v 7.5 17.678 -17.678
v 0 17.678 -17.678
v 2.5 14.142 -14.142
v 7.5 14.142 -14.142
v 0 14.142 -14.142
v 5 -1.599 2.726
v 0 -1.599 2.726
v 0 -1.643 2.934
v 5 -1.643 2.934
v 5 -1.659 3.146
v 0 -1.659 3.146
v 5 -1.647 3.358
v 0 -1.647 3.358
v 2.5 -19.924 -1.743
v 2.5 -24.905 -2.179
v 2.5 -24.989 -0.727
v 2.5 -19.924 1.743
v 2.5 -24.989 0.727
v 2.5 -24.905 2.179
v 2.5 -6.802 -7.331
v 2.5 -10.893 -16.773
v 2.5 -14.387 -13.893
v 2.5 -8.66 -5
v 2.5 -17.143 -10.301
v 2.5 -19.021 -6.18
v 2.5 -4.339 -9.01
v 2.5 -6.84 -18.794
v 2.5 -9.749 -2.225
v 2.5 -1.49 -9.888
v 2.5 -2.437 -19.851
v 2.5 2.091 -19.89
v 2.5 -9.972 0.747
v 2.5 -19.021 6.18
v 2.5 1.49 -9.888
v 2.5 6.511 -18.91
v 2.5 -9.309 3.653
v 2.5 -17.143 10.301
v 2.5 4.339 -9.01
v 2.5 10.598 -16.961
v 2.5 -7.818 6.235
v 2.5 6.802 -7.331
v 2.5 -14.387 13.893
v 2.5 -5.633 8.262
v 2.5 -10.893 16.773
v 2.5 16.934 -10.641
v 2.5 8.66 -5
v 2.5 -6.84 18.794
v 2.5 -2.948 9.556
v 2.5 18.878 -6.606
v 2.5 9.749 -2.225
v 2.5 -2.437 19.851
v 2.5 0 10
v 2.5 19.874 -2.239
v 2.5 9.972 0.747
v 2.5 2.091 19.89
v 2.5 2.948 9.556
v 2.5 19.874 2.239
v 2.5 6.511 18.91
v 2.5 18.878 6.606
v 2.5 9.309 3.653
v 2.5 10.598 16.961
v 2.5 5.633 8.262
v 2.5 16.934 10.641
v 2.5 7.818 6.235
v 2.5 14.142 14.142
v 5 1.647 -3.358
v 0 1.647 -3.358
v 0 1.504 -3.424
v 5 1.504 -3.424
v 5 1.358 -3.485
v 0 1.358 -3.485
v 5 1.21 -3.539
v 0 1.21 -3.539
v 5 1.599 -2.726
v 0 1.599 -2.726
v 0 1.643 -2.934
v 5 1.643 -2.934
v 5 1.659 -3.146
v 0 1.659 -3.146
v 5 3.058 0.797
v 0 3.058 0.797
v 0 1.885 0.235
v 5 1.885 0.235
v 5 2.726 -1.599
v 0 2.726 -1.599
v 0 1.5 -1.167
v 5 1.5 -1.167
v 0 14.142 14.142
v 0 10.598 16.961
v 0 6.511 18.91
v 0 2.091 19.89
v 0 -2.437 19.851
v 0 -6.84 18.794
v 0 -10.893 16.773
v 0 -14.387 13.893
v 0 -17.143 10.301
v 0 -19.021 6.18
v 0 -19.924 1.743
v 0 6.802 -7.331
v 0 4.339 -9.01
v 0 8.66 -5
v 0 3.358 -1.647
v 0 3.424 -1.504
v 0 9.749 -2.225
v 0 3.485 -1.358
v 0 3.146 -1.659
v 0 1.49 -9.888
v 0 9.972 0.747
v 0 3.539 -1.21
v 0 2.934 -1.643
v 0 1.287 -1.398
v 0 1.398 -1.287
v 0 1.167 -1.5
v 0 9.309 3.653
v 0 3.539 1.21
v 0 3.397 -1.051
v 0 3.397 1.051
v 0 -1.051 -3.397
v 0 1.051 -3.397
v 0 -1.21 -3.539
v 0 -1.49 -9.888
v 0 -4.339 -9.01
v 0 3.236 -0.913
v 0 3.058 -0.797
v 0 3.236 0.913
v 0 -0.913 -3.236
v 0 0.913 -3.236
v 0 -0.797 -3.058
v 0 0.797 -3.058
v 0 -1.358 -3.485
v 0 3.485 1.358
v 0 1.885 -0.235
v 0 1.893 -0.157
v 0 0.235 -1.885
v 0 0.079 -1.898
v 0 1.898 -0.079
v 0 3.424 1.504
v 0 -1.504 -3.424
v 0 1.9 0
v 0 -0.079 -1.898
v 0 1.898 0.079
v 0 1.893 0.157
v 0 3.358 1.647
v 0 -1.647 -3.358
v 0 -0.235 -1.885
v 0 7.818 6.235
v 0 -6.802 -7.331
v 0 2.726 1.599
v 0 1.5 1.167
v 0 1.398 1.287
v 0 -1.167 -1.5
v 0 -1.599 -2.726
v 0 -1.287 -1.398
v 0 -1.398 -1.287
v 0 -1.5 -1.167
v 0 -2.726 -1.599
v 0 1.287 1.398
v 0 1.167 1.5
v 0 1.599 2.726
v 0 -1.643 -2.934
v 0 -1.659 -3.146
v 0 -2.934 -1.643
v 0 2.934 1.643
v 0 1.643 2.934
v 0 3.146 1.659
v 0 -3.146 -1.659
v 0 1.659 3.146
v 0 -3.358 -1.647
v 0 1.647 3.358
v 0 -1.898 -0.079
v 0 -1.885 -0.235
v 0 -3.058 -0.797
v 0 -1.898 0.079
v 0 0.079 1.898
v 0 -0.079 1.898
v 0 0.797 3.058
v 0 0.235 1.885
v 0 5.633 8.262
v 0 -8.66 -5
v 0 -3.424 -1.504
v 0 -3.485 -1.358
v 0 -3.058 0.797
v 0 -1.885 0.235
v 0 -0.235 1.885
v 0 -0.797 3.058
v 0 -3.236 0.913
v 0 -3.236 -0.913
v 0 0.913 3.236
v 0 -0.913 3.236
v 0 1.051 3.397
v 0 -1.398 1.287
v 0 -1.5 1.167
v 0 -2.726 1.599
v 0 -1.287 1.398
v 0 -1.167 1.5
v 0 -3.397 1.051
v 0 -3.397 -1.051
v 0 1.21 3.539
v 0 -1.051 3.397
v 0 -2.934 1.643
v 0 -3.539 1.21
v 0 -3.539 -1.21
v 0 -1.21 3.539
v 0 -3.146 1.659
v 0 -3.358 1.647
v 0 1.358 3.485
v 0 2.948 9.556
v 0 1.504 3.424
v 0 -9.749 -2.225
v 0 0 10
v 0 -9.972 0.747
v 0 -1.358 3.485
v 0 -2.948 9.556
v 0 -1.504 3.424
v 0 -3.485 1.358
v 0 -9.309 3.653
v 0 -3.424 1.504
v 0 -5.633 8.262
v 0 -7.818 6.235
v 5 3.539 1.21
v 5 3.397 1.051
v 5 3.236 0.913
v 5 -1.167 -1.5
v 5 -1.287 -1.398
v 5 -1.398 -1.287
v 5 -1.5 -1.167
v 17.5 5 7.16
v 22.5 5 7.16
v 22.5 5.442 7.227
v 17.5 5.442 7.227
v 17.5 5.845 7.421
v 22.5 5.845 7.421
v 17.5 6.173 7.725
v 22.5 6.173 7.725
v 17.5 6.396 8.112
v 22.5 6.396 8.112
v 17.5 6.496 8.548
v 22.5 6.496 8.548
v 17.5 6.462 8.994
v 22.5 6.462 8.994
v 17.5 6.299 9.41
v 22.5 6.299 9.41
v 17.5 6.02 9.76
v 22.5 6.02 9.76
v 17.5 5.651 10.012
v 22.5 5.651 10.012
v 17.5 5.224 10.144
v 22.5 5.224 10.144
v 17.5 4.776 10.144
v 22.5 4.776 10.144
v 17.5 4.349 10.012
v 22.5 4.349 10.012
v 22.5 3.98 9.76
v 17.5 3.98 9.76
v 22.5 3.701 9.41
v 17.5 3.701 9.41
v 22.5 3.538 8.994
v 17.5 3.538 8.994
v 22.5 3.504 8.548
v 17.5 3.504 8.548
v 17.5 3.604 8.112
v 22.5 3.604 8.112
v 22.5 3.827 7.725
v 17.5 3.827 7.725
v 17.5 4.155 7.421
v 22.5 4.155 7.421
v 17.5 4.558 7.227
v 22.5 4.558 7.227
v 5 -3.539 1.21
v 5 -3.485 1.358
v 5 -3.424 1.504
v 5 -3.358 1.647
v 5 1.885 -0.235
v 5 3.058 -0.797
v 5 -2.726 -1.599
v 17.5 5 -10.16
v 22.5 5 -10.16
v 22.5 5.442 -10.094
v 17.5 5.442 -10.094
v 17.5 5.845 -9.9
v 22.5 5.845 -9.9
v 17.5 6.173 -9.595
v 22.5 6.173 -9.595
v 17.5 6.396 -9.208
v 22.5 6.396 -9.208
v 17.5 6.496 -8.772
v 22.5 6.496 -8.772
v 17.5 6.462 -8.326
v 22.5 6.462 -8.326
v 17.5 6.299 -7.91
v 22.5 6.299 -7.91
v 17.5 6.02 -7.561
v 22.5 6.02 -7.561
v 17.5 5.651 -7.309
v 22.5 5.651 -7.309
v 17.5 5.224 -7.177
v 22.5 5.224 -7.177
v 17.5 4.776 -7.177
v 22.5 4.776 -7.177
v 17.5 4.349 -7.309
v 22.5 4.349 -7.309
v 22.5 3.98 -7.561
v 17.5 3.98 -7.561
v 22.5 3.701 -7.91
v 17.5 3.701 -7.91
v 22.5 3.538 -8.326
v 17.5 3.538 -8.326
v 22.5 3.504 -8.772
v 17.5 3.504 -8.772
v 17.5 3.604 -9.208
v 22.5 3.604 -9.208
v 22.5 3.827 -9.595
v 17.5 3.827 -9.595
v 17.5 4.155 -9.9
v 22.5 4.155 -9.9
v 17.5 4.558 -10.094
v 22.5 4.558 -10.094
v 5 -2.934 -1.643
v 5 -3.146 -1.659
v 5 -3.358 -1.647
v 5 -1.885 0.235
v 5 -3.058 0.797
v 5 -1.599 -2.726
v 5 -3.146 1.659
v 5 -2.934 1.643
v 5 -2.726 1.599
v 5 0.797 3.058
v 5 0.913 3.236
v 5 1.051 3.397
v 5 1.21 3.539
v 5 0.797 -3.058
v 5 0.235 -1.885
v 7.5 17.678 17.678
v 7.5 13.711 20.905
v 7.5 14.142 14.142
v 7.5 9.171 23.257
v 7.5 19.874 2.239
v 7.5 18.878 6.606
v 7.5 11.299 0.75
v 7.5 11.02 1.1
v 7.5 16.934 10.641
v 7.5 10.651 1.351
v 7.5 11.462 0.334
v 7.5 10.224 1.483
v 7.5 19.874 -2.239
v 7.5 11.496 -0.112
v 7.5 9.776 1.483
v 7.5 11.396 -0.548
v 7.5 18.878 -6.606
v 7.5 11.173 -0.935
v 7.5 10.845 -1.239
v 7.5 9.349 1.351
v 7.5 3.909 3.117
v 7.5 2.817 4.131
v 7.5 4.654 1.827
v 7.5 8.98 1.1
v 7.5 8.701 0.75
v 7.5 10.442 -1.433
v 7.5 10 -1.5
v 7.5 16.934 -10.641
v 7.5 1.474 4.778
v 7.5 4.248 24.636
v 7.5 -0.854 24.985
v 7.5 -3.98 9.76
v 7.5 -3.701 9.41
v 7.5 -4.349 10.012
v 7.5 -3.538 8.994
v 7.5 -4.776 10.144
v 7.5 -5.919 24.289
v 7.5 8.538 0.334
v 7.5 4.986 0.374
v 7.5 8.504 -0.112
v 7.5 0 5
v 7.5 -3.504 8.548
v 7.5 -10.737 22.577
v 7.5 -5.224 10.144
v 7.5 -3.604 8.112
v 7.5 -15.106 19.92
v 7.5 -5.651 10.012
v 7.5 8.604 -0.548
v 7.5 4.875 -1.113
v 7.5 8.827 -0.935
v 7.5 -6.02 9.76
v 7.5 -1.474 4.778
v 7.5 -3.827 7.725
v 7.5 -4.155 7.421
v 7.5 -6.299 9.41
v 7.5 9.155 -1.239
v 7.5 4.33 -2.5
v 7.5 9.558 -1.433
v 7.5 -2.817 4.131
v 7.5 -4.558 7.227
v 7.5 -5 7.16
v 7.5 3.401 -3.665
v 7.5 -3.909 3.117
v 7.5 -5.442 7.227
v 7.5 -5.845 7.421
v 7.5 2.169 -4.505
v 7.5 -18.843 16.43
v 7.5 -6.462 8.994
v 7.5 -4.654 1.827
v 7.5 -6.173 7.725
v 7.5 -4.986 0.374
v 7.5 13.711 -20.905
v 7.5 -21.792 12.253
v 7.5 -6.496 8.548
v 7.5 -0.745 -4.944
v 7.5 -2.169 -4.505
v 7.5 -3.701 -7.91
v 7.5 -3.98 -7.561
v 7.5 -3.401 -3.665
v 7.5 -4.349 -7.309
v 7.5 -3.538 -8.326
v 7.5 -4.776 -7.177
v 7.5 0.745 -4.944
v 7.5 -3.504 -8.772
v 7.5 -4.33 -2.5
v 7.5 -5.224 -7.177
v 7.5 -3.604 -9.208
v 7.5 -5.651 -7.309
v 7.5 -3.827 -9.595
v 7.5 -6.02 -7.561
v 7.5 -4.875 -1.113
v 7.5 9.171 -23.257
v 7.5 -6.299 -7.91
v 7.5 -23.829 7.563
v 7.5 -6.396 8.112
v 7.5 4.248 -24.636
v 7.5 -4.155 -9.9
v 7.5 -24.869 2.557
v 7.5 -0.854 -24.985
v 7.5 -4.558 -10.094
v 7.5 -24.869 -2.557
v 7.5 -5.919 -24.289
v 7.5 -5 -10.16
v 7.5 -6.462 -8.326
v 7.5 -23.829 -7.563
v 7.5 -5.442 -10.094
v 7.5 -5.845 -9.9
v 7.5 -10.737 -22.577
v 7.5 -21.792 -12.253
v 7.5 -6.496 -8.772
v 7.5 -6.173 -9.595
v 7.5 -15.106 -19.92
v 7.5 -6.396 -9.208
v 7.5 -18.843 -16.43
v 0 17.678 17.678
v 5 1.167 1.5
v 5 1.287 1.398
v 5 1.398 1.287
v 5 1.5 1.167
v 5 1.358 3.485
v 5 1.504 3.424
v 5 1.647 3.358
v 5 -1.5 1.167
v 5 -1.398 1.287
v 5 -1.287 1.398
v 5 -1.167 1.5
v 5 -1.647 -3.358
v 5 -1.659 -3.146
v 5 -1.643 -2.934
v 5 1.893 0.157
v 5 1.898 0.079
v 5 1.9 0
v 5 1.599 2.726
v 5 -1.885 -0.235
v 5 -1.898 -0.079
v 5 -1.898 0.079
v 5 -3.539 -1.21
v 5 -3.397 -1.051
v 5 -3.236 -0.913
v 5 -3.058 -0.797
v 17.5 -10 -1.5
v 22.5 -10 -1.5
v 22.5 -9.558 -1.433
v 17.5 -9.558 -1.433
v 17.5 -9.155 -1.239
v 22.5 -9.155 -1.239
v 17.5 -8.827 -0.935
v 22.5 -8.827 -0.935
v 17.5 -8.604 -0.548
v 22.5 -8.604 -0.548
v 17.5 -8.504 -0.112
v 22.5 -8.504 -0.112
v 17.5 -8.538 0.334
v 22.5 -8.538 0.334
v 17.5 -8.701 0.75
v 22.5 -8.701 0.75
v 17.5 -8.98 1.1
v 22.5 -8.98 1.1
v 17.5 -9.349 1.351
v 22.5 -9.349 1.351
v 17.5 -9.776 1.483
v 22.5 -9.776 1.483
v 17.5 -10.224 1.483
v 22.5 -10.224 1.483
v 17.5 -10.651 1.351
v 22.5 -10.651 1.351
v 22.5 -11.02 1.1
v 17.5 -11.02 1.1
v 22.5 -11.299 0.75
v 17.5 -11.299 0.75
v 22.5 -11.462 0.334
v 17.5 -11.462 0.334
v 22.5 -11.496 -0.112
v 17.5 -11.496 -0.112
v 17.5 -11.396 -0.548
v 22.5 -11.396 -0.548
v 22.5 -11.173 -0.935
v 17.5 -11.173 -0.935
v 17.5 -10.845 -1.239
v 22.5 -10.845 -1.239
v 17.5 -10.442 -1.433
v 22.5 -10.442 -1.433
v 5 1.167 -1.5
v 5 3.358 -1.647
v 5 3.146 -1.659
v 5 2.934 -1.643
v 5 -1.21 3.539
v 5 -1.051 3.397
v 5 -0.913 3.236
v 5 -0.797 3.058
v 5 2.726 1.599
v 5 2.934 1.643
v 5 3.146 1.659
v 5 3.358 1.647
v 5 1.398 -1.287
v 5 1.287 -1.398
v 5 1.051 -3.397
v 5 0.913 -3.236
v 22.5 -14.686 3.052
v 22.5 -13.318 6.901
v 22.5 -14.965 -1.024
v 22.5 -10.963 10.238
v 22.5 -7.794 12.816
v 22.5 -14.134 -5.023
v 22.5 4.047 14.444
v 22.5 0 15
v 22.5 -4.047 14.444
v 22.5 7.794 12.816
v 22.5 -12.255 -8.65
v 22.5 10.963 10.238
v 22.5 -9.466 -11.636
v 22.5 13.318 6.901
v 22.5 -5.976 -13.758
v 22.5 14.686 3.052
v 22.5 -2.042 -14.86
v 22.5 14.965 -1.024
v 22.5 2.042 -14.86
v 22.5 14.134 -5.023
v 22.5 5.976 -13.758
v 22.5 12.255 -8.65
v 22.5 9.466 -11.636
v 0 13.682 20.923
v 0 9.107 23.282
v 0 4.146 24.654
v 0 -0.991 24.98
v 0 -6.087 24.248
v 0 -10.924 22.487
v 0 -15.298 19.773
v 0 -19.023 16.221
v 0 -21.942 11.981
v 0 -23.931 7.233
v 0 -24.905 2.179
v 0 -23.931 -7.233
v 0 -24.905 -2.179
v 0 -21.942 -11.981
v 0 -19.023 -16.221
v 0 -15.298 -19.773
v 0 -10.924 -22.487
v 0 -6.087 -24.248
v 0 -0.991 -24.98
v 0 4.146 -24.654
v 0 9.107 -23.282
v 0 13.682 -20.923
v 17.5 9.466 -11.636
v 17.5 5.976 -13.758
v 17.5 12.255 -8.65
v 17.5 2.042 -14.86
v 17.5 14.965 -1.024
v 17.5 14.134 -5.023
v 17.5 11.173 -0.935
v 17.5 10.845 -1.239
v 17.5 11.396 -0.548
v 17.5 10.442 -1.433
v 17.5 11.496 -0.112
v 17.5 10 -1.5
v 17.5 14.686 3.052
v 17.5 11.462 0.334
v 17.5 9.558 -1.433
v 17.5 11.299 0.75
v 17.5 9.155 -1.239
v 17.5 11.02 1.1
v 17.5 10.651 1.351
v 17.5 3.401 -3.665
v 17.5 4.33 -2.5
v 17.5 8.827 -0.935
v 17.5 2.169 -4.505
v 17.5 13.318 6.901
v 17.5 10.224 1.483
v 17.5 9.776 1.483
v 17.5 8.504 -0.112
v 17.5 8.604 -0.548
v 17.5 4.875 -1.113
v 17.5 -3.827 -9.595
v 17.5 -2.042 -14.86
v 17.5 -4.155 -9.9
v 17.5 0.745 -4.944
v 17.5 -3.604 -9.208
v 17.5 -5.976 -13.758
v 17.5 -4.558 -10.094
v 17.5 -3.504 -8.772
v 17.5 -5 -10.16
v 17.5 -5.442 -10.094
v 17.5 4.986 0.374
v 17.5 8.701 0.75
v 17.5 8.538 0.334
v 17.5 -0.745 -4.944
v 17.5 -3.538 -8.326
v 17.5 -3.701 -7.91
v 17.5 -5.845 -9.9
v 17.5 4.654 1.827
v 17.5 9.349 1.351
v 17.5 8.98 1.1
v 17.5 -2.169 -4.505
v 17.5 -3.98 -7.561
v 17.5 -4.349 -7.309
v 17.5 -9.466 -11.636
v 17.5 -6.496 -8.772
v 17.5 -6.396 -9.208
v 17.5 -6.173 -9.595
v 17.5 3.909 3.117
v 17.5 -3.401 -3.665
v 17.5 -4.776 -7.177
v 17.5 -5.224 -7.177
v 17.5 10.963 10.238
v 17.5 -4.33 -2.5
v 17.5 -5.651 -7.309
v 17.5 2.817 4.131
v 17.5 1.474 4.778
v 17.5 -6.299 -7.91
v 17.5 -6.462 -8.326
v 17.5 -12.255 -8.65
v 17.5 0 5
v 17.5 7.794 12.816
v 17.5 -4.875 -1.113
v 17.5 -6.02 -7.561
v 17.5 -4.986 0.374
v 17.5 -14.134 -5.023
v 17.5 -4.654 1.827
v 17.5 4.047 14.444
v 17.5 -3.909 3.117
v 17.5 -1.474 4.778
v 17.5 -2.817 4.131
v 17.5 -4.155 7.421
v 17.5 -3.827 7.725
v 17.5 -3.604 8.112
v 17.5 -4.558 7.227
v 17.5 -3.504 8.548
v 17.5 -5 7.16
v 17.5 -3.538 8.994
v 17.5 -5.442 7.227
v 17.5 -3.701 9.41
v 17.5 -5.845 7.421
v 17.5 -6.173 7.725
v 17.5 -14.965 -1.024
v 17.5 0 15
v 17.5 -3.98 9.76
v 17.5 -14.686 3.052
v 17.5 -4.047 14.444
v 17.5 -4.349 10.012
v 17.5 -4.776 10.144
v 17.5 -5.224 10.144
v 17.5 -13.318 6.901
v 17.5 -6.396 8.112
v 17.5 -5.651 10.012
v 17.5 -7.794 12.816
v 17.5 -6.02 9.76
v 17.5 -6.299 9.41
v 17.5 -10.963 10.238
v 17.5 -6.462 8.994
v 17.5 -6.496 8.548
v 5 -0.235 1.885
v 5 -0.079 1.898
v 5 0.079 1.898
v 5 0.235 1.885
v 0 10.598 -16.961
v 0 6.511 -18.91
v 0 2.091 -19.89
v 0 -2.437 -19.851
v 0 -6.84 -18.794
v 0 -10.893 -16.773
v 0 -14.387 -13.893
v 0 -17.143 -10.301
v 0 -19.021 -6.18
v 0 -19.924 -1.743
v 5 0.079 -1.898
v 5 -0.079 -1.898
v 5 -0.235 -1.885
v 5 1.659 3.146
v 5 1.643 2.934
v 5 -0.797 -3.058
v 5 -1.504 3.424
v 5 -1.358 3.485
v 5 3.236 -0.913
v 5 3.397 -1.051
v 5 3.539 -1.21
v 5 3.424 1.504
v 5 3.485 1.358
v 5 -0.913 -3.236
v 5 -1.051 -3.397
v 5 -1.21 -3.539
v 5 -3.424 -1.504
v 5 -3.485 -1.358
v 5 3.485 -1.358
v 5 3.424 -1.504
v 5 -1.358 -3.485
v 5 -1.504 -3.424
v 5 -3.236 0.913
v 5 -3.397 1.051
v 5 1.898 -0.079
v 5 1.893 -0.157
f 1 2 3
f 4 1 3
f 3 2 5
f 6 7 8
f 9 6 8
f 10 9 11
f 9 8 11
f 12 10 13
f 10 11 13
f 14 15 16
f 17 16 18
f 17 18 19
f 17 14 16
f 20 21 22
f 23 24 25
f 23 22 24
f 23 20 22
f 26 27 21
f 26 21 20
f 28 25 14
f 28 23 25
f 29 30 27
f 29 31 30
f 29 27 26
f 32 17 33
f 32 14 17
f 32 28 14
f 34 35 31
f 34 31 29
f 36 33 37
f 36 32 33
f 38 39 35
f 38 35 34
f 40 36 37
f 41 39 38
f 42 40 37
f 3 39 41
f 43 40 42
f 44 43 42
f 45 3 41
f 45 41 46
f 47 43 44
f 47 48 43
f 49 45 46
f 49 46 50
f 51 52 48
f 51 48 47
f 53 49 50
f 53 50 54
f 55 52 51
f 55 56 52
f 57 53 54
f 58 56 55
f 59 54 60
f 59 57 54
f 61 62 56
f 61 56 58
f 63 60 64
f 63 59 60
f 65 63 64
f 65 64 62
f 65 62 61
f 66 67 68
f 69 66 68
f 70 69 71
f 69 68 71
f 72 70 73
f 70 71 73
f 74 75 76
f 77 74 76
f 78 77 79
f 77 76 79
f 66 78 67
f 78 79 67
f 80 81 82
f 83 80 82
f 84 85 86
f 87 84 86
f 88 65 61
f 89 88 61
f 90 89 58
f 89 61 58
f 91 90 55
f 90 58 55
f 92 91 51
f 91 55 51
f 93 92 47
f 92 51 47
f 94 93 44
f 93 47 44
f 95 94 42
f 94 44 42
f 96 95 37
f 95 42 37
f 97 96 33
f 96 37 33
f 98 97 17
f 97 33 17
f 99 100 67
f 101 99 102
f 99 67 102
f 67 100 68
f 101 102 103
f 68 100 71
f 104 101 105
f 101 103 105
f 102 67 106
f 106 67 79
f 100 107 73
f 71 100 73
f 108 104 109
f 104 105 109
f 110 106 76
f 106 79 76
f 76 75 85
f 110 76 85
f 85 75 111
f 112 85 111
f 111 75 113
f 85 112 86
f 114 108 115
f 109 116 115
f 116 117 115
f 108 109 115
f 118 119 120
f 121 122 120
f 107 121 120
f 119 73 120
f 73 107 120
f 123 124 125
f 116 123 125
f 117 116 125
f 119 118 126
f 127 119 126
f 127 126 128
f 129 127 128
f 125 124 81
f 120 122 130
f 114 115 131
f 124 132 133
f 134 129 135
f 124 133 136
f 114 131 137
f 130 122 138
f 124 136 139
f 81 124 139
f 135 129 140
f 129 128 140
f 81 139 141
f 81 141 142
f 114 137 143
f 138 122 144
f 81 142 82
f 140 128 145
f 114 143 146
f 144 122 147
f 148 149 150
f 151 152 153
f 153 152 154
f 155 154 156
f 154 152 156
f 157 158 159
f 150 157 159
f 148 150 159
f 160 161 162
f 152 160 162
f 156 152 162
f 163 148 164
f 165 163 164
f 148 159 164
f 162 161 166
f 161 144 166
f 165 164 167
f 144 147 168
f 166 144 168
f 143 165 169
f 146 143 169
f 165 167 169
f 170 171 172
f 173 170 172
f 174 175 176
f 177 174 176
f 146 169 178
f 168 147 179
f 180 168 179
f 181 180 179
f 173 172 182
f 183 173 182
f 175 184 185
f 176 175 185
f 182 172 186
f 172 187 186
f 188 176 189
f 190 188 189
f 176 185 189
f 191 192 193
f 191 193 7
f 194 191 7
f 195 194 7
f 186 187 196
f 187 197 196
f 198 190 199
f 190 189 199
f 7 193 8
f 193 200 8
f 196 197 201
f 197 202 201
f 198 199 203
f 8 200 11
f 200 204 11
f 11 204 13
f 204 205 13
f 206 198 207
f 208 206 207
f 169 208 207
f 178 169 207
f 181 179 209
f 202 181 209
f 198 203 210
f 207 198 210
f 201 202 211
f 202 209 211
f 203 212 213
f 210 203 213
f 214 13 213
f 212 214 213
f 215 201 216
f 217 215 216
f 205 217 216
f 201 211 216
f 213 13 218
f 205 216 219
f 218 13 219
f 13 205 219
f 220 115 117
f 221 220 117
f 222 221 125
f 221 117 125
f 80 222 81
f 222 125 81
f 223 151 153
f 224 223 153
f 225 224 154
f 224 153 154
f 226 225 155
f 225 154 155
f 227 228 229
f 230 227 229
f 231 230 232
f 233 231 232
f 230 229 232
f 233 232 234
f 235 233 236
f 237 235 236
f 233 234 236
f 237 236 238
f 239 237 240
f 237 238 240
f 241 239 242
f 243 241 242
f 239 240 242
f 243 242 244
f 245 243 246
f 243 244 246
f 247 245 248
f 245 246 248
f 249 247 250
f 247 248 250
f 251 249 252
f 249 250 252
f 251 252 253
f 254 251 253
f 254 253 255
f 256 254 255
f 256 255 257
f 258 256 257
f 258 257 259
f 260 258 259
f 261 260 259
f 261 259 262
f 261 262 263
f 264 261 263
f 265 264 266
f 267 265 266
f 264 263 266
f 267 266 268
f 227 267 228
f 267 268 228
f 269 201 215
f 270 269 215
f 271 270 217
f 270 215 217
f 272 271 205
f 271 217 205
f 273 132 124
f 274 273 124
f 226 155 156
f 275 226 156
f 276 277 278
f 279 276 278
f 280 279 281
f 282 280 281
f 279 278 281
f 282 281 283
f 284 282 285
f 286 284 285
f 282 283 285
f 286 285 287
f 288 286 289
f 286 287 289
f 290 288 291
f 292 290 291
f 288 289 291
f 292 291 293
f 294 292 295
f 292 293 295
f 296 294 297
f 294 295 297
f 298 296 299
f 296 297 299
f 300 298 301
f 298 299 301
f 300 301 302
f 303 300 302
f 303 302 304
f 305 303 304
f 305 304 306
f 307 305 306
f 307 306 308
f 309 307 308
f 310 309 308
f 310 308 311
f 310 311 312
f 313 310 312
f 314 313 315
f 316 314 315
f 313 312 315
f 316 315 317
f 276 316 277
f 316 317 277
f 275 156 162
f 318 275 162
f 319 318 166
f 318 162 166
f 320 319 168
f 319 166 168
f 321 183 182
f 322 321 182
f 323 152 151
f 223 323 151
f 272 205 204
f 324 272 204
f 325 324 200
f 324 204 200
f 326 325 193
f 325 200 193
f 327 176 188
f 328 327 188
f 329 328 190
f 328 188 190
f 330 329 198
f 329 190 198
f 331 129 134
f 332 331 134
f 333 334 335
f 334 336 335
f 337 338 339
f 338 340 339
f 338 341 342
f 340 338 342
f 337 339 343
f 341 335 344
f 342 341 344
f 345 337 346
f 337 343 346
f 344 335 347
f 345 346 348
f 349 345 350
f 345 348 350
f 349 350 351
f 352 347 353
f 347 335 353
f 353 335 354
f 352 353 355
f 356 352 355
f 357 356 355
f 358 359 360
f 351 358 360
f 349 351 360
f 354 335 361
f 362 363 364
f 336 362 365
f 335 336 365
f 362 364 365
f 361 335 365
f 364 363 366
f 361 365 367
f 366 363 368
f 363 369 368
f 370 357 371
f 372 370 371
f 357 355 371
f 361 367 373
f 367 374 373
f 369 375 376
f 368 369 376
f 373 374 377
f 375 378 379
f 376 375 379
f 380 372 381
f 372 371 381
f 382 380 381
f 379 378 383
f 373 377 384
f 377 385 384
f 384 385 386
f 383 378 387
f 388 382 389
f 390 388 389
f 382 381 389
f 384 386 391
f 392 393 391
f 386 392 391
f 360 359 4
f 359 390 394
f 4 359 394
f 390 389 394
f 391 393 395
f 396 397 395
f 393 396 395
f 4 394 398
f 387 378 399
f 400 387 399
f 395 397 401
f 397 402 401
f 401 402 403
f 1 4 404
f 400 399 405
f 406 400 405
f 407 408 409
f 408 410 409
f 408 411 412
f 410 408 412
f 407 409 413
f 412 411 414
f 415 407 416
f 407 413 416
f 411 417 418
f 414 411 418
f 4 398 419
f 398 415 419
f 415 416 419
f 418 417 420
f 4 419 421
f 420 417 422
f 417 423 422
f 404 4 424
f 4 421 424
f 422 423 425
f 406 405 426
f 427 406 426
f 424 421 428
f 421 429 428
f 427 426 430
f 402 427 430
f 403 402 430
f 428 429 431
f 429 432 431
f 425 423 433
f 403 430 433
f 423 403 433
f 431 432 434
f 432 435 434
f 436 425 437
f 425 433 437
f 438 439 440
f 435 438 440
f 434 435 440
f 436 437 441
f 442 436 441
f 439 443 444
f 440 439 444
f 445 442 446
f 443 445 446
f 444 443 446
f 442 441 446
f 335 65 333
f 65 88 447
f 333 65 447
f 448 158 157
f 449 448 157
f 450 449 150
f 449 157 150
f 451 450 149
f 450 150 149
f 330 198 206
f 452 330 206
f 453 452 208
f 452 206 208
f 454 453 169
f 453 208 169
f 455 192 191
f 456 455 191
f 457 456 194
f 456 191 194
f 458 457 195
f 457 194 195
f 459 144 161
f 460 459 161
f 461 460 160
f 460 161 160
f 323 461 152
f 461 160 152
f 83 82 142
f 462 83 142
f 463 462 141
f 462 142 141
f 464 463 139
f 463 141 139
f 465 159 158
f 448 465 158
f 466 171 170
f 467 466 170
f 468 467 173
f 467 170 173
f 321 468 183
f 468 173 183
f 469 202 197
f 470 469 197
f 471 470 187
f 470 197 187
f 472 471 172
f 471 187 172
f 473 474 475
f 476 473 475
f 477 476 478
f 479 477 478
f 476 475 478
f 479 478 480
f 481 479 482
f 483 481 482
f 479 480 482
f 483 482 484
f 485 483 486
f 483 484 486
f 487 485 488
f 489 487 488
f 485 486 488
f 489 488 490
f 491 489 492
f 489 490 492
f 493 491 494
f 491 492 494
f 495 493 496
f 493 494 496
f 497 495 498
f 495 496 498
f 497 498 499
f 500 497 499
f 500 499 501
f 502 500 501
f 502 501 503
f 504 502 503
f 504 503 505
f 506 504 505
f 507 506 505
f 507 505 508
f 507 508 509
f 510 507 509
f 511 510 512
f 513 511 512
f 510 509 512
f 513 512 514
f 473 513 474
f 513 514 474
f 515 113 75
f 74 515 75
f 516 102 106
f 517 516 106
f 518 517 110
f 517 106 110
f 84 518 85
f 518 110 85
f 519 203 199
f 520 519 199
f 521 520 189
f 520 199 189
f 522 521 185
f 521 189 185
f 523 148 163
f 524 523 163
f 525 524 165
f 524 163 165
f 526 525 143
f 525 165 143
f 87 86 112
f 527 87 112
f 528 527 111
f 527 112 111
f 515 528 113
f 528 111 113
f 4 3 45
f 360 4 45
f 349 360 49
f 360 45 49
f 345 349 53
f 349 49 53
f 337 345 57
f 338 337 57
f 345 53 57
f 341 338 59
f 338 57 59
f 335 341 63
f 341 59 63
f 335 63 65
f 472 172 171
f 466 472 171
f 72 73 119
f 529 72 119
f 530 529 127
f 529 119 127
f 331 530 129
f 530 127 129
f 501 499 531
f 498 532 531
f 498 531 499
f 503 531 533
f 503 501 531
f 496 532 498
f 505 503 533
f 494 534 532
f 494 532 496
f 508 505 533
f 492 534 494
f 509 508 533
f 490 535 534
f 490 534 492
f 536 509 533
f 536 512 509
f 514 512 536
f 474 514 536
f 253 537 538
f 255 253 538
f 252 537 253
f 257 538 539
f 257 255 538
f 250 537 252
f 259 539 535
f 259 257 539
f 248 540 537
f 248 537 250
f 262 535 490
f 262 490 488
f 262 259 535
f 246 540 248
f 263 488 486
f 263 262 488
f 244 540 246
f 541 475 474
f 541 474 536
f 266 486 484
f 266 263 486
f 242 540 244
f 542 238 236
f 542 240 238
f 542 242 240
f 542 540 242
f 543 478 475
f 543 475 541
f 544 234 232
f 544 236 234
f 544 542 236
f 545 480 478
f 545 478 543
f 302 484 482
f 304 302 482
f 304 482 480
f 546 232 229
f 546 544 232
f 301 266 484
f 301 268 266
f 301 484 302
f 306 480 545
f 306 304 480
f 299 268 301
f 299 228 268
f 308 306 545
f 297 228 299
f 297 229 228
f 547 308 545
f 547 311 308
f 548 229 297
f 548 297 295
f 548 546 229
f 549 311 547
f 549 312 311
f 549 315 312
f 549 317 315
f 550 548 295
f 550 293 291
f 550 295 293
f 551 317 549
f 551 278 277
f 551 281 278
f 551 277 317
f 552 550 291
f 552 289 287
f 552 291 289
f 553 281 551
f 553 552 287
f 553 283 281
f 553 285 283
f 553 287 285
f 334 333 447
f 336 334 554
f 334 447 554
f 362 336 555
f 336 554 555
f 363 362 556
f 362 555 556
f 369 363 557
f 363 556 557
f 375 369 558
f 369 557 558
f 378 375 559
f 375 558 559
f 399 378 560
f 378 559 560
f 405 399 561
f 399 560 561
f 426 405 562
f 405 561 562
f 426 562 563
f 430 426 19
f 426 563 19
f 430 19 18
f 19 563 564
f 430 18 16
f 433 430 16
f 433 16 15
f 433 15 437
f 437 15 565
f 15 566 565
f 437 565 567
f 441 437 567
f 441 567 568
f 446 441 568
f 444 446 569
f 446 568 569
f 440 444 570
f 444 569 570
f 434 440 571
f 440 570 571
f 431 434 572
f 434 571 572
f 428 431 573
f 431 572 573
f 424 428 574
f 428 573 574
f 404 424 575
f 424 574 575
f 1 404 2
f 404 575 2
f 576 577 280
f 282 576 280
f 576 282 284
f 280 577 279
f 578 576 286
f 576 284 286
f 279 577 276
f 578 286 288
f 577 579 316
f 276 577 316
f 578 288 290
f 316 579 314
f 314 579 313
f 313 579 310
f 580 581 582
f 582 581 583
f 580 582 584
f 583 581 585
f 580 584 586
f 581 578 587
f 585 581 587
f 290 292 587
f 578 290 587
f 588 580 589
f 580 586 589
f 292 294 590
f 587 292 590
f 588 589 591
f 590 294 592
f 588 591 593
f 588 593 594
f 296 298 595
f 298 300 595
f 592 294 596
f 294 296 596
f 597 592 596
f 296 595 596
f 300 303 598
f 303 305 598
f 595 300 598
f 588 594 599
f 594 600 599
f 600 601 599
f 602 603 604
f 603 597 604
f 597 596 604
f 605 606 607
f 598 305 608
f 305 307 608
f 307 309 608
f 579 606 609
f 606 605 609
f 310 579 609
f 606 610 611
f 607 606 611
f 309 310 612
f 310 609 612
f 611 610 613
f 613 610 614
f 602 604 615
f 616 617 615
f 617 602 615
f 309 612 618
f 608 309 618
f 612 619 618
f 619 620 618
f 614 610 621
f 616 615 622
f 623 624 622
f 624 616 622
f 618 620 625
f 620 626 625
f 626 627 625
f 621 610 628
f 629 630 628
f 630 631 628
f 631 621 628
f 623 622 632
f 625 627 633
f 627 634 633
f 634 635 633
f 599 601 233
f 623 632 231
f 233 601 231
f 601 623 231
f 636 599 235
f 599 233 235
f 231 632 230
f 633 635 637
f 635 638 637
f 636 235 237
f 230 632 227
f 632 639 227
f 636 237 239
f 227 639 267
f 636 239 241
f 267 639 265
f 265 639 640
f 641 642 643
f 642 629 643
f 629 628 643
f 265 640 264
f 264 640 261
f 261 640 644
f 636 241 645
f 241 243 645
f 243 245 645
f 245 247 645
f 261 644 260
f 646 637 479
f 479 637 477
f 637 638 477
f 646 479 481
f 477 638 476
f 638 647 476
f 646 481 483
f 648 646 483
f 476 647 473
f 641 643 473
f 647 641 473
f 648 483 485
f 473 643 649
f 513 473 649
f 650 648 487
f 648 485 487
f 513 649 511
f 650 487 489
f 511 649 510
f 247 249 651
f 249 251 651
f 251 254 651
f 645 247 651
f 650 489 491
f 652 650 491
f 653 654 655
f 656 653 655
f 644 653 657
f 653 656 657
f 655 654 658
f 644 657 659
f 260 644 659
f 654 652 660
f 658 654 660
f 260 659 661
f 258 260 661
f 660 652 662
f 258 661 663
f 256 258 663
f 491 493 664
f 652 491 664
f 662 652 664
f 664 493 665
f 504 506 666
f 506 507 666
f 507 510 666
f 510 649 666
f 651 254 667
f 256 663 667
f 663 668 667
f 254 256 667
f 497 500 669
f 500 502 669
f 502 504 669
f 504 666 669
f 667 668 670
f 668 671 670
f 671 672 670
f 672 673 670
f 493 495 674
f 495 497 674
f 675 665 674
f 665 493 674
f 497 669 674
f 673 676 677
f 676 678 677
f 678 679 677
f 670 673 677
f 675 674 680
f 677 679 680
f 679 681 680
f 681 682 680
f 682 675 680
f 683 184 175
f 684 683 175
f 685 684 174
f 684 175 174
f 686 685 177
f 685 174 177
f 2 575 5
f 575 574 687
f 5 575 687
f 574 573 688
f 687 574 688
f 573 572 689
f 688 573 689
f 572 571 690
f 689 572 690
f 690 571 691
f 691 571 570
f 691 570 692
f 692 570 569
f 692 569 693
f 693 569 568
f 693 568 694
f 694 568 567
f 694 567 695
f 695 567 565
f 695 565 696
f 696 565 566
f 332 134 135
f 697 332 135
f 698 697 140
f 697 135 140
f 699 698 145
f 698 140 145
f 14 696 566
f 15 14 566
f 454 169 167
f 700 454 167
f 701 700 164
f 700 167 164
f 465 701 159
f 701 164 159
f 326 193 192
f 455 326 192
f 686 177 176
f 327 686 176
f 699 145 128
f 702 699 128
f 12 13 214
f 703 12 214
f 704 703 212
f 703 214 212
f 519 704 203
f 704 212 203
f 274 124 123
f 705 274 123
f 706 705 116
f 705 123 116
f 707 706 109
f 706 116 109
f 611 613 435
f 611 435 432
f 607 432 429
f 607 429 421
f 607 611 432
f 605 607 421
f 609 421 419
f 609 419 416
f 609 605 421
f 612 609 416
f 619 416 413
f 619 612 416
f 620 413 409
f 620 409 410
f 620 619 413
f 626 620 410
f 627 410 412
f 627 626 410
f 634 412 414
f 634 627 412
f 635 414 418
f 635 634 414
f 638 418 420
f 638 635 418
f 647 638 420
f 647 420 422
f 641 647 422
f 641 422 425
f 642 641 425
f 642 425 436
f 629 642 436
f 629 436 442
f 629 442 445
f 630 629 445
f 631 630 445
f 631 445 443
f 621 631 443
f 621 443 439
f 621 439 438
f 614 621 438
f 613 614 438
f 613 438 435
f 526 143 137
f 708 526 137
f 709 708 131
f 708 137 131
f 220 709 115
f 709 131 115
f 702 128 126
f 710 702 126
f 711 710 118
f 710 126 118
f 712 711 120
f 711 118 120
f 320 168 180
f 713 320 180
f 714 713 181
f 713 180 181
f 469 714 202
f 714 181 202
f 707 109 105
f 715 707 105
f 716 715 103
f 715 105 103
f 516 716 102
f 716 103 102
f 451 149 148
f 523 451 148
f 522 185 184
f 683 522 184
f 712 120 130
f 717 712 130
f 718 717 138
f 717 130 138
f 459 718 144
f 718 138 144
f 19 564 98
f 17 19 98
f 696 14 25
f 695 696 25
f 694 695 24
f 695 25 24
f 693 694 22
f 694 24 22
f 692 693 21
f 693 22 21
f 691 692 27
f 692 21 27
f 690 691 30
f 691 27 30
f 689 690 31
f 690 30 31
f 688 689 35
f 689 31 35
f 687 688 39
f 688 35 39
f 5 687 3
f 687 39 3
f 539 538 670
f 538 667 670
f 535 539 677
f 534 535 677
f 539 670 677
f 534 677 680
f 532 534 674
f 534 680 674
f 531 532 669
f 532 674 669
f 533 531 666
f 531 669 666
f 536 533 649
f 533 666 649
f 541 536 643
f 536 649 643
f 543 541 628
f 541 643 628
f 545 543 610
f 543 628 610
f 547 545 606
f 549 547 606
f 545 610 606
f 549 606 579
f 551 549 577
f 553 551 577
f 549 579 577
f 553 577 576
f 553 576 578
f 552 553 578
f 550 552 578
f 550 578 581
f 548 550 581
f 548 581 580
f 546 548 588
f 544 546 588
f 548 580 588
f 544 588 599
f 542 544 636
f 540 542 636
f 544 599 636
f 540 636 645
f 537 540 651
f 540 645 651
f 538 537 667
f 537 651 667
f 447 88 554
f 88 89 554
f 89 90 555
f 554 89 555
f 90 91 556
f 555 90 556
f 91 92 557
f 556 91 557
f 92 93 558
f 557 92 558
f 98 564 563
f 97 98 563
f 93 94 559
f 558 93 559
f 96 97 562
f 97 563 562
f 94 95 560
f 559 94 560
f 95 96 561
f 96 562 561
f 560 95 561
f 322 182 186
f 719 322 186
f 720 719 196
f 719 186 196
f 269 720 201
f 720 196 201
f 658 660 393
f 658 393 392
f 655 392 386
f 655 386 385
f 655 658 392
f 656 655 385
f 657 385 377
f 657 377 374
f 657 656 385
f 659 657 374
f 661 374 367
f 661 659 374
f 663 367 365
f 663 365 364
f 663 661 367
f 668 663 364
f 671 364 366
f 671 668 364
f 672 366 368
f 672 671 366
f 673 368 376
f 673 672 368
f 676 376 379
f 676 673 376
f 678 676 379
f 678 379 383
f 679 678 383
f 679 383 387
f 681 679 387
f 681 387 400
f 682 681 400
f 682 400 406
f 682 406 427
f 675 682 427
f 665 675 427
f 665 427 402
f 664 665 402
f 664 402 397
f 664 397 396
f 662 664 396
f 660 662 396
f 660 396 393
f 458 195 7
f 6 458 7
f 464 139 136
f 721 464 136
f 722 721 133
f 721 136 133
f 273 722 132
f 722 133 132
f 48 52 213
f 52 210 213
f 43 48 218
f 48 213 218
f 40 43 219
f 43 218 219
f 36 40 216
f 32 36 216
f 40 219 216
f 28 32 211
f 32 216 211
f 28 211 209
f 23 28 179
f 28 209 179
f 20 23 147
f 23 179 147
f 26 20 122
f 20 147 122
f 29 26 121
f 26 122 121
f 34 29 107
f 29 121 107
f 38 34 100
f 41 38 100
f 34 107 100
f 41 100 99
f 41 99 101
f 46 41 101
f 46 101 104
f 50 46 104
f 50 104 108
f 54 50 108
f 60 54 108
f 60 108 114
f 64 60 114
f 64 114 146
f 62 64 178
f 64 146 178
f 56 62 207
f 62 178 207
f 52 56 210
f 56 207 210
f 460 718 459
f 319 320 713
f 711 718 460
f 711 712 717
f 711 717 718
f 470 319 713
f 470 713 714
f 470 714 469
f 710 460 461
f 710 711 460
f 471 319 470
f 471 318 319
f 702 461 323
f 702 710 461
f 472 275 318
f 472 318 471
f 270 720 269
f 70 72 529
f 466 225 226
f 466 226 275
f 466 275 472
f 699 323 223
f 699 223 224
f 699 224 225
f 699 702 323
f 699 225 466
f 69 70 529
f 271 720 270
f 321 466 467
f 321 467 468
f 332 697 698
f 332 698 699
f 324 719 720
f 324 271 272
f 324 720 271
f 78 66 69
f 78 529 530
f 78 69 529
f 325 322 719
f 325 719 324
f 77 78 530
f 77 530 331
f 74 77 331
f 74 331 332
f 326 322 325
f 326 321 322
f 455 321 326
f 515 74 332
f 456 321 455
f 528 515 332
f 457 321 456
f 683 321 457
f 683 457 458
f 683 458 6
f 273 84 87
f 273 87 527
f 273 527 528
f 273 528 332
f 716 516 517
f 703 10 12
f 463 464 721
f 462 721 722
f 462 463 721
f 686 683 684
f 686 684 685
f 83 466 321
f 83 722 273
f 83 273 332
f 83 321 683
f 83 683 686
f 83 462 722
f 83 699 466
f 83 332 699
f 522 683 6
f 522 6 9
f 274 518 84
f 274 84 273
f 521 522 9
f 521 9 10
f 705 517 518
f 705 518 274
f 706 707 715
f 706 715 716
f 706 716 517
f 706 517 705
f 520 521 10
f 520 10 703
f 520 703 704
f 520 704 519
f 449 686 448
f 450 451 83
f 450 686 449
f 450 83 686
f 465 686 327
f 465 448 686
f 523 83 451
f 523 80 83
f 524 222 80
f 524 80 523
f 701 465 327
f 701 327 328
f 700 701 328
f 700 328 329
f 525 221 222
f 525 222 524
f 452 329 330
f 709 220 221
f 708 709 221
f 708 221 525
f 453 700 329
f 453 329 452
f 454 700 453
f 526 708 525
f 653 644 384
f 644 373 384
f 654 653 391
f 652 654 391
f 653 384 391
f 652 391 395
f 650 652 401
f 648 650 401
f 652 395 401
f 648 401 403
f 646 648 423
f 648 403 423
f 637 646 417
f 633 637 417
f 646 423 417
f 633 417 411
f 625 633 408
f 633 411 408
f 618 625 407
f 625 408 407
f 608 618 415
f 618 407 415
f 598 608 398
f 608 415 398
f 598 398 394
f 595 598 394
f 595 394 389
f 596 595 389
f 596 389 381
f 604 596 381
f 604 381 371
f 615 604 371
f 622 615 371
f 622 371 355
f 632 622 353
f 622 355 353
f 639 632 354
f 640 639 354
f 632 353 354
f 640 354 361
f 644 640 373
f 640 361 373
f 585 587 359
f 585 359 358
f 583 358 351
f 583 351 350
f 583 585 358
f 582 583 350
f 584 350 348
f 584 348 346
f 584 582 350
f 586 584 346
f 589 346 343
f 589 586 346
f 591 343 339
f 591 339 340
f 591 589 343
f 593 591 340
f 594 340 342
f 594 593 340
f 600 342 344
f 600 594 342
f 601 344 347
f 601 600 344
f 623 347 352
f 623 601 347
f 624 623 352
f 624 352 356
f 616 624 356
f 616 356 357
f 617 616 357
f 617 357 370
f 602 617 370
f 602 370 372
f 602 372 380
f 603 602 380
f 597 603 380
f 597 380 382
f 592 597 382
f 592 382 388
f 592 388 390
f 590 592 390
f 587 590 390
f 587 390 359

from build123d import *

# Parameters (mm, degrees)
CORTAR_EXTRUIR2_DEPTH   = 7.5
CORTAR_EXTRUIR3_DEPTH   = 2.5
CROQUIS5_R              = 1.5
CORTAR_EXTRUIR4_DEPTH   = 5
CROQUIS6_R              = 1.5
SALIENTE_EXTRUIR1_DEPTH = 15
CORTAR_EXTRUIR5_DEPTH   = 5


with BuildPart() as part:
    # Croquis1 → Revolución1 (revolve)
    with BuildSketch(Plane(origin=(0, 0, 0), x_dir=(1, 0, 0), z_dir=(0, 1, 0)), mode=Mode.PRIVATE) as revoluci_n1_sk:
        Polygon((0, 0), (22.5, 0), (22.5, 15), (17.5, 15), (17.5, 5), (7.5, 5), (7.5, 25), (0, 25), (0, 20), (2.5, 20), (2.5, 10), (0, 10), align=None)
    revolve(revoluci_n1_sk.sketch.rotate(Axis((0, 0, 0), (1, 0, 0)), 180), axis=Axis((0, 0, 0), (1, 0, 0)))

    # Croquis2 → Cortar-Extruir2 (cut)
    with BuildSketch(Plane.ZY):
        with BuildLine():
            ThreePointArc((-14.142135624, 14.142135624), (0, 20), (14.142135624, 14.142135624))
            Line((14.142135624, 14.142135624), (17.67766953, 17.67766953))
            ThreePointArc((17.67766953, 17.67766953), (0, 25), (-17.67766953, 17.67766953))
            Line((-17.67766953, 17.67766953), (-14.142135624, 14.142135624))
        make_face()
    extrude(amount=-CORTAR_EXTRUIR2_DEPTH, mode=Mode.SUBTRACT)

    # Croquis4 → Cortar-Extruir3 (cut)
    with BuildSketch(Plane.ZY):
        with BuildLine():
            ThreePointArc((1.743114855, -19.923893962), (0, -20), (-1.743114855, -19.923893962))
            Line((-1.743114855, -19.923893962), (-2.178893569, -24.904867452))
            ThreePointArc((-2.178893569, -24.904867452), (0, -25), (2.178893569, -24.904867452))
            Line((2.178893569, -24.904867452), (1.743114855, -19.923893962))
        make_face()
    extrude(amount=-CORTAR_EXTRUIR3_DEPTH, mode=Mode.SUBTRACT)

    # Croquis5 → Cortar-Extruir4 (cut)
    with BuildSketch(Plane(origin=(22.5, 0, 0), x_dir=(0, 0, -1), z_dir=(1, 0, 0))):
        with Locations((0, -10)):
            Circle(CROQUIS5_R)
        with Locations((-8.660254038, 5)):
            Circle(CROQUIS5_R)
        with Locations((8.660254038, 5)):
            Circle(CROQUIS5_R)
    extrude(amount=-CORTAR_EXTRUIR4_DEPTH, mode=Mode.SUBTRACT)

    # Croquis6 → Saliente-Extruir1 (add)
    with BuildSketch(Plane(origin=(22.5, 0, 0), x_dir=(0, 0, -1), z_dir=(1, 0, 0))):
        with Locations((0, 10)):
            Circle(CROQUIS6_R)
        with Locations((8.660254038, -5)):
            Circle(CROQUIS6_R)
        with Locations((-8.660254038, -5)):
            Circle(CROQUIS6_R)
    extrude(amount=-SALIENTE_EXTRUIR1_DEPTH)

    # Croquis7 → Cortar-Extruir5 (cut)
    with BuildSketch(Plane.ZY):
        with BuildLine():
            Line((-0.23528257, 1.885375854), (-0.796607872, 3.057943083))
            ThreePointArc((-0.796607872, 3.057943083), (-0.979134174, 3.319175723), (-1.21, 3.538855747))
            ThreePointArc((-1.21, 3.538855747), (-1.431236037, 3.455309452), (-1.646749691, 3.357948102))
            ThreePointArc((-1.646749691, 3.357948102), (-1.654659248, 3.039364075), (-1.599005463, 2.725579118))
            Line((-1.599005463, 2.725579118), (-1.166792151, 1.499531952))
            ThreePointArc((-1.166792151, 1.499531952), (-1.343502884, 1.343502884), (-1.499531952, 1.166792151))
            Line((-1.499531952, 1.166792151), (-2.725579118, 1.599005463))
            ThreePointArc((-2.725579118, 1.599005463), (-3.039364075, 1.654659248), (-3.357948102, 1.646749691))
            ThreePointArc((-3.357948102, 1.646749691), (-3.455309452, 1.431236037), (-3.538855747, 1.21))
            ThreePointArc((-3.538855747, 1.21), (-3.319175723, 0.979134174), (-3.057943083, 0.796607872))
            Line((-3.057943083, 0.796607872), (-1.885375854, 0.23528257))
            ThreePointArc((-1.885375854, 0.23528257), (-1.9, 0), (-1.885375854, -0.23528257))
            Line((-1.885375854, -0.23528257), (-3.057943083, -0.796607872))
            ThreePointArc((-3.057943083, -0.796607872), (-3.319175723, -0.979134174), (-3.538855747, -1.21))
            ThreePointArc((-3.538855747, -1.21), (-3.455309452, -1.431236037), (-3.357948102, -1.646749691))
            ThreePointArc((-3.357948102, -1.646749691), (-3.039364075, -1.654659248), (-2.725579118, -1.599005463))
            Line((-2.725579118, -1.599005463), (-1.499531952, -1.166792151))
            ThreePointArc((-1.499531952, -1.166792151), (-1.343502884, -1.343502884), (-1.166792151, -1.499531952))
            Line((-1.166792151, -1.499531952), (-1.599005463, -2.725579118))
            ThreePointArc((-1.599005463, -2.725579118), (-1.654659248, -3.039364075), (-1.646749691, -3.357948102))
            ThreePointArc((-1.646749691, -3.357948102), (-1.431236037, -3.455309452), (-1.21, -3.538855747))
            ThreePointArc((-1.21, -3.538855747), (-0.979134174, -3.319175723), (-0.796607872, -3.057943083))
            Line((-0.796607872, -3.057943083), (-0.23528257, -1.885375854))
            ThreePointArc((-0.23528257, -1.885375854), (0, -1.9), (0.23528257, -1.885375854))
            Line((0.23528257, -1.885375854), (0.796607872, -3.057943083))
            ThreePointArc((0.796607872, -3.057943083), (0.979134174, -3.319175723), (1.21, -3.538855747))
            ThreePointArc((1.21, -3.538855747), (1.431236037, -3.455309452), (1.646749691, -3.357948102))
            ThreePointArc((1.646749691, -3.357948102), (1.654659248, -3.039364075), (1.599005463, -2.725579118))
            Line((1.599005463, -2.725579118), (1.166792151, -1.499531952))
            ThreePointArc((1.166792151, -1.499531952), (1.343502884, -1.343502884), (1.499531952, -1.166792151))
            Line((1.499531952, -1.166792151), (2.725579118, -1.599005463))
            ThreePointArc((2.725579118, -1.599005463), (3.039364075, -1.654659248), (3.357948102, -1.646749691))
            ThreePointArc((3.357948102, -1.646749691), (3.455309452, -1.431236037), (3.538855747, -1.21))
            ThreePointArc((3.538855747, -1.21), (3.319175723, -0.979134174), (3.057943083, -0.796607872))
            Line((3.057943083, -0.796607872), (1.885375854, -0.23528257))
            ThreePointArc((1.885375854, -0.23528257), (1.9, 0), (1.885375854, 0.23528257))
            Line((1.885375854, 0.23528257), (3.057943083, 0.796607872))
            ThreePointArc((3.057943083, 0.796607872), (3.319175723, 0.979134174), (3.538855747, 1.21))
            ThreePointArc((3.538855747, 1.21), (3.455309452, 1.431236037), (3.357948102, 1.646749691))
            ThreePointArc((3.357948102, 1.646749691), (3.039364075, 1.654659248), (2.725579118, 1.599005463))
            Line((2.725579118, 1.599005463), (1.499531952, 1.166792151))
            ThreePointArc((1.499531952, 1.166792151), (1.343502884, 1.343502884), (1.166792151, 1.499531952))
            Line((1.166792151, 1.499531952), (1.599005463, 2.725579118))
            ThreePointArc((1.599005463, 2.725579118), (1.654659248, 3.039364075), (1.646749691, 3.357948102))
            ThreePointArc((1.646749691, 3.357948102), (1.431236037, 3.455309452), (1.21, 3.538855747))
            ThreePointArc((1.21, 3.538855747), (0.979134174, 3.319175723), (0.796607872, 3.057943083))
            Line((0.796607872, 3.057943083), (0.23528257, 1.885375854))
            ThreePointArc((0.23528257, 1.885375854), (0.117868309, 1.896340439), (0, 1.9))
            ThreePointArc((0, 1.9), (-0.117868309, 1.896340439), (-0.23528257, 1.885375854))
        make_face()
    extrude(amount=-CORTAR_EXTRUIR5_DEPTH, mode=Mode.SUBTRACT)


solid = part.part
